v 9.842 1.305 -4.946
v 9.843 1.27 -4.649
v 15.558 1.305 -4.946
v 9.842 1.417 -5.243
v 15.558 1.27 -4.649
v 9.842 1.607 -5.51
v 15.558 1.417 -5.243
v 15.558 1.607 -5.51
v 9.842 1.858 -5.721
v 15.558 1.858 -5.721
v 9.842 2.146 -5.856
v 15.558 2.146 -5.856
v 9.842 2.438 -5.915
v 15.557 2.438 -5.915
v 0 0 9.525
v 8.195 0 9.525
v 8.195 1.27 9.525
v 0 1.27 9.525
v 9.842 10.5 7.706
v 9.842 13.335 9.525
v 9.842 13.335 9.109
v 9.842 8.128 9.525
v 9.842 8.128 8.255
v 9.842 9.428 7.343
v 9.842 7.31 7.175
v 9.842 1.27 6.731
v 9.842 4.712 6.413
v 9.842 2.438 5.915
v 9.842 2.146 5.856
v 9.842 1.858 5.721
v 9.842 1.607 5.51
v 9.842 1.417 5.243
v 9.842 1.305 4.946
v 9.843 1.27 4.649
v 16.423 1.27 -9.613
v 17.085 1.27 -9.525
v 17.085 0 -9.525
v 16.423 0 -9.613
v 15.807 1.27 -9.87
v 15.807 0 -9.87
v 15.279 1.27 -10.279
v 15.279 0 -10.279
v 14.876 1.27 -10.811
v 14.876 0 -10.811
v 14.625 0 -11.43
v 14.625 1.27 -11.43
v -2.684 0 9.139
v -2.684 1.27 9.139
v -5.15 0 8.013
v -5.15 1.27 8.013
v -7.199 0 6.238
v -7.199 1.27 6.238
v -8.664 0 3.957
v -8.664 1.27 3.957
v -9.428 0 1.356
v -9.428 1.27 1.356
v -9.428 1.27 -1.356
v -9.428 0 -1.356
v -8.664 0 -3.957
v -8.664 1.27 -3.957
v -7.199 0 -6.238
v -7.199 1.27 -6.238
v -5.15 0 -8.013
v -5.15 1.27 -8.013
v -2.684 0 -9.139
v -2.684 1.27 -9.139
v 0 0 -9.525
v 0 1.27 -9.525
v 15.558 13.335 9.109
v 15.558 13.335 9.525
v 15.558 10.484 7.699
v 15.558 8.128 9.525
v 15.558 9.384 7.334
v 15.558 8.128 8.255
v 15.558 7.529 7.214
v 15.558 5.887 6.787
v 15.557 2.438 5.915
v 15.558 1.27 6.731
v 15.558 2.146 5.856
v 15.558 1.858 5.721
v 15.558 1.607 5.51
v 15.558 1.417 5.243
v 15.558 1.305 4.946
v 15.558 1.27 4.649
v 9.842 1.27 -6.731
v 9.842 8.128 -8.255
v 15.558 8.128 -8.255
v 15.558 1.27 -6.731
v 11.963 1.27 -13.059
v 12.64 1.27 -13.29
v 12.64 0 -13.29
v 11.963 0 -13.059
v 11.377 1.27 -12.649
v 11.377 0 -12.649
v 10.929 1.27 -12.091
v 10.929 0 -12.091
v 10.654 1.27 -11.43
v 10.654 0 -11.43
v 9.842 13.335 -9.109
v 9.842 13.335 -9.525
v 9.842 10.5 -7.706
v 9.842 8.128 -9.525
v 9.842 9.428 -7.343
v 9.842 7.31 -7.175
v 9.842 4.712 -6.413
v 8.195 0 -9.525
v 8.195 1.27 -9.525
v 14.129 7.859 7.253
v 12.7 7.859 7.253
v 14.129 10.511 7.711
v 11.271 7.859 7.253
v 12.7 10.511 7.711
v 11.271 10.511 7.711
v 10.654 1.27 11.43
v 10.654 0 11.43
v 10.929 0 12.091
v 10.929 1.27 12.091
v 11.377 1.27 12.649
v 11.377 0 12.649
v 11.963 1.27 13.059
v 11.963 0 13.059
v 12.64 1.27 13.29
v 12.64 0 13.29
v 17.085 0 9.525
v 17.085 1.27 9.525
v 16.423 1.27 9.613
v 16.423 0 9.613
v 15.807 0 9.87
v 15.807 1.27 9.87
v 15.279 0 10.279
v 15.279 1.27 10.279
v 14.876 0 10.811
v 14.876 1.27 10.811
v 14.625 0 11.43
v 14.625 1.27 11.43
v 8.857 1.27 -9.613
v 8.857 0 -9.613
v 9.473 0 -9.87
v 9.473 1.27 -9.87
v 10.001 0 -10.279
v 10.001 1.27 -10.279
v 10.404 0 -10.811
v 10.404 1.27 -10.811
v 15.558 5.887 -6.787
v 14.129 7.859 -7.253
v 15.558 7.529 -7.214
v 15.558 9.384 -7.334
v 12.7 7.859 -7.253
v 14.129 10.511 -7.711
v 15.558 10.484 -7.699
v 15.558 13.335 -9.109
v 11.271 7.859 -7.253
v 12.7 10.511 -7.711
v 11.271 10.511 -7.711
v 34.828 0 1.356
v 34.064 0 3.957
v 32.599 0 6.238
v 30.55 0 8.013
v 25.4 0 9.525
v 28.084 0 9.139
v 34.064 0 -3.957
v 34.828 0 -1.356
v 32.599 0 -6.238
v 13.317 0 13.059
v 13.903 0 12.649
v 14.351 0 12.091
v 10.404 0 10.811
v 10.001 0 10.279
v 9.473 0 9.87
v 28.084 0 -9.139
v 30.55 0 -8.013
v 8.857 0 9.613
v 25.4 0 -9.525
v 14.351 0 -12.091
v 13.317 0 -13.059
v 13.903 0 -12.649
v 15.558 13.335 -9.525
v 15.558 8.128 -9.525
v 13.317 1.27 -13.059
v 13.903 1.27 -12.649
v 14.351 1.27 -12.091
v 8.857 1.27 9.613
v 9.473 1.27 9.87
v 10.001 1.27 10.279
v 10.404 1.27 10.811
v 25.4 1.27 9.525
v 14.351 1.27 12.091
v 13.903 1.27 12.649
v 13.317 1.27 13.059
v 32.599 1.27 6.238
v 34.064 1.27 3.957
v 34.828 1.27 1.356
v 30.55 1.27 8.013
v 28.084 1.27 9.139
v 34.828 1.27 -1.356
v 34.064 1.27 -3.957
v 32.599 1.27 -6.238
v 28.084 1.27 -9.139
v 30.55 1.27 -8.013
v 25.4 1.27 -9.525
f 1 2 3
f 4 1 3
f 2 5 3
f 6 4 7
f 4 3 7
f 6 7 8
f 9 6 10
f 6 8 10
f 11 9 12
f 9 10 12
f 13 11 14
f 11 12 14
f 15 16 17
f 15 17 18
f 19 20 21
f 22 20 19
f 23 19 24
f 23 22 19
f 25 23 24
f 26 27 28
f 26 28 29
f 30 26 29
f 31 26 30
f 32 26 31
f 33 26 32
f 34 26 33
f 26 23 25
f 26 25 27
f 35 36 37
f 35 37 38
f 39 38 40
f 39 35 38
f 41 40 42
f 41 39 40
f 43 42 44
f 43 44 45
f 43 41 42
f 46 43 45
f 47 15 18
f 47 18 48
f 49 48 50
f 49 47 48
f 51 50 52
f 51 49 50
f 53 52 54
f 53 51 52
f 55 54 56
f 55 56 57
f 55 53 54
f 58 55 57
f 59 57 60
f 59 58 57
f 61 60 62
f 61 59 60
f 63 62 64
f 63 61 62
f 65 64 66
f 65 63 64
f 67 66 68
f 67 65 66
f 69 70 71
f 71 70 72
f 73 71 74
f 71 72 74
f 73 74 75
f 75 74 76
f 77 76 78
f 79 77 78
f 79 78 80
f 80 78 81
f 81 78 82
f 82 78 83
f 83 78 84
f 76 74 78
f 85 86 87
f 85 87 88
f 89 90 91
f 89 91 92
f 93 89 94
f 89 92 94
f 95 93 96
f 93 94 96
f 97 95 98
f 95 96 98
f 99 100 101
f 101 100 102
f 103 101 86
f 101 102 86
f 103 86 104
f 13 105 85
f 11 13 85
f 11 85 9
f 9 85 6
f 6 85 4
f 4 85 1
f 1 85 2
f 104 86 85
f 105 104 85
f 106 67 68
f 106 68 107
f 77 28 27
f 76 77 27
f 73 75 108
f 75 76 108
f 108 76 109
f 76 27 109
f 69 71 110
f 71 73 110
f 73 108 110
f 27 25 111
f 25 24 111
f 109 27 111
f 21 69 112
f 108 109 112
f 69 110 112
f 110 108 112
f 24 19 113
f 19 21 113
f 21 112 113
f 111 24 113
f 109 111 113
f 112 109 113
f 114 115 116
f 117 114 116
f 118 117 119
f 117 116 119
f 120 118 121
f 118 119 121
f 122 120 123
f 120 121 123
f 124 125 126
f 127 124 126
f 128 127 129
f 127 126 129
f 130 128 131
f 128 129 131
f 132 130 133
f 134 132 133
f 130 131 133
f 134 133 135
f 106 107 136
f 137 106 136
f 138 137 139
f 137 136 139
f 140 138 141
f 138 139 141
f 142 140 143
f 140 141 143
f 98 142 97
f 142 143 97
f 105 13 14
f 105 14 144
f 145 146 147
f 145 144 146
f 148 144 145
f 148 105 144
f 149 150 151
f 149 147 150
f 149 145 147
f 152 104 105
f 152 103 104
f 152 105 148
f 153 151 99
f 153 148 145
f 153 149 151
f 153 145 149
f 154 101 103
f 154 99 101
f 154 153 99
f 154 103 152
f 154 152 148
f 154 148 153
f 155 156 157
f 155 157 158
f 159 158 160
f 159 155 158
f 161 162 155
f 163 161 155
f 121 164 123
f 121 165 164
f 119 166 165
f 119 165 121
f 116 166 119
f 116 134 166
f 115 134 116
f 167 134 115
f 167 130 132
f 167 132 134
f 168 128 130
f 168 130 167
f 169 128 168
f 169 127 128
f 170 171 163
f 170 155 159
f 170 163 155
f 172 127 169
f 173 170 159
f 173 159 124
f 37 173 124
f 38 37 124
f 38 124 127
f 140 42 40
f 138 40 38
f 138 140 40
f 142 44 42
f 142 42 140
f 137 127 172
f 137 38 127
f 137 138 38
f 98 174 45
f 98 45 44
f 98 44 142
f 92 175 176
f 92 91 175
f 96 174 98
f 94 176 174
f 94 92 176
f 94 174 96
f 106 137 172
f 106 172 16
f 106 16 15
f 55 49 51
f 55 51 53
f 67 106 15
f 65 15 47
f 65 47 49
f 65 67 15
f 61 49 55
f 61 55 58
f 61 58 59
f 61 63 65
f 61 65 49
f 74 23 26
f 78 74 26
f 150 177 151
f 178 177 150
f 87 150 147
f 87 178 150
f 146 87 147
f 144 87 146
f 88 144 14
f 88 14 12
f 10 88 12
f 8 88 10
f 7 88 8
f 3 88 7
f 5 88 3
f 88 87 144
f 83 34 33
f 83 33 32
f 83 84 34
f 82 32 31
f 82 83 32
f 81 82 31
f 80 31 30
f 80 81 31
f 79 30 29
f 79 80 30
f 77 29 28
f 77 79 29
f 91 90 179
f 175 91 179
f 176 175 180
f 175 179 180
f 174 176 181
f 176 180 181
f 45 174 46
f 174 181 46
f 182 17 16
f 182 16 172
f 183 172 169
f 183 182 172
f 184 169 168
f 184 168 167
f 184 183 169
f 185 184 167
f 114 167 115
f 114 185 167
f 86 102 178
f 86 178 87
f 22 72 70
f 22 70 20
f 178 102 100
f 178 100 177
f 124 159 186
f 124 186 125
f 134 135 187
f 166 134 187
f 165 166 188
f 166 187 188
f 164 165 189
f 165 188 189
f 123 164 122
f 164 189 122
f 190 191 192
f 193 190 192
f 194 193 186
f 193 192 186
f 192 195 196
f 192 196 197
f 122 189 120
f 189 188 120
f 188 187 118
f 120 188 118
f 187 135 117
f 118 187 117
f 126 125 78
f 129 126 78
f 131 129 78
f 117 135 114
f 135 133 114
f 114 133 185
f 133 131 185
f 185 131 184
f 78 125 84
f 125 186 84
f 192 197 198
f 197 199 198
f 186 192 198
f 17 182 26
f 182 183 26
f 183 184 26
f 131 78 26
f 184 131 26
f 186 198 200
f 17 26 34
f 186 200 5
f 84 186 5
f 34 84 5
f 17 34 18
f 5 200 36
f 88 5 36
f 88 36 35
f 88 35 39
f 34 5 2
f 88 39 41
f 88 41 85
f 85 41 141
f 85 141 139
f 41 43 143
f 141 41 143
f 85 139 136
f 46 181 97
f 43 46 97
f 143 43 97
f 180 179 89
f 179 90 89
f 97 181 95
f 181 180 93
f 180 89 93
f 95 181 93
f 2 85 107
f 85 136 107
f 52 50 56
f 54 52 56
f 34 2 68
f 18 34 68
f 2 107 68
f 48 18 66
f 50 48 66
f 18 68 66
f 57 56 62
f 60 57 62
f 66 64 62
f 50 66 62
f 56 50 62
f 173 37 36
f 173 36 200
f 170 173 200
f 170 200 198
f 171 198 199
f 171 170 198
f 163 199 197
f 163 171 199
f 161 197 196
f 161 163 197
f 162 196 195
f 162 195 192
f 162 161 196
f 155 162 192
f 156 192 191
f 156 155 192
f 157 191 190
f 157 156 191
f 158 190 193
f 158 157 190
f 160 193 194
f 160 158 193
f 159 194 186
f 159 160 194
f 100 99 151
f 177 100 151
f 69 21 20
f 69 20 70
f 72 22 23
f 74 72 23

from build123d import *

# Parameters (mm, degrees)
BOSS_EXTRUDE1_DEPTH = 1.27
SKETCH2_W           = 5.715
SKETCH2_H           = 3.81
BOSS_EXTRUDE2_DEPTH = 12.065
CUT_EXTRUDE1_REACH  = 31.961
SKETCH5_W           = 3.81
SKETCH5_H           = 1.27
BOSS_EXTRUDE3_DEPTH = 3.81
FILLET1_R           = 1.27
FILLET2_R           = 2.54
FILLET3_R           = 2.54


with BuildPart() as part:
    # Sketch1 → Boss-Extrude1 (new body)
    with BuildSketch(Plane(origin=(0, 0, 0), x_dir=(1, 0, 0), z_dir=(0, 1, 0))):
        with BuildLine():
            Line((0, 9.525), (25.4, 9.525))
            ThreePointArc((25.4, 9.525), (34.925, 0), (25.4, -9.525))
            Line((25.4, -9.525), (0, -9.525))
            ThreePointArc((0, -9.525), (-9.525, 0), (0, 9.525))
        make_face()
    extrude(amount=BOSS_EXTRUDE1_DEPTH)

    # Sketch2 → Boss-Extrude2 (add)
    with BuildSketch(Plane(origin=(0, 1.27, 0), x_dir=(1, 0, 0), z_dir=(0, 1, 0))):
        with Locations((12.7, -7.62)):
            Rectangle(SKETCH2_W, SKETCH2_H)
    boss_extrude2 = extrude(amount=BOSS_EXTRUDE2_DEPTH)

    # Sketch3 → Cut-Extrude1 (cut, up to next)
    with BuildSketch(Plane.ZY.offset(-9.8425), mode=Mode.PRIVATE) as cut_extrude1_sk1:
        with BuildLine():
            Line((9.109202439, 13.335), (5.715, 13.335))
            Line((5.715, 13.335), (5.715, 1.27))
            Line((5.715, 1.27), (5.969, 1.27))
            add(Edge.make_bspline(
                [(5.969, 1.27), (5.549329098, 3.350430894), (7.78448223, 7.25064686), (7.073380845, 9.287510022), (8.952423462, 12.969109679), (8.055818696, 11.368012808), (9.109202439, 13.335)],
                knots=[0, 0, 0, 0, 0.483315661, 0.688146198, 0.724664182, 1, 1, 1, 1], degree=3))
        make_face()
    cut_extrude1_tool1 = extrude(cut_extrude1_sk1.sketch, amount=-CUT_EXTRUDE1_REACH, mode=Mode.PRIVATE) & part.part
    # Sketch3 → Cut-Extrude1 (cut, up to next)
    with BuildSketch(Plane.ZY.offset(-9.8425), mode=Mode.PRIVATE) as cut_extrude1_sk2:
        Polygon((9.525, 1.27), (9.525, 8.128), (8.255, 8.128), (6.731, 1.27), align=None)
    cut_extrude1_tool2 = extrude(cut_extrude1_sk2.sketch, amount=-CUT_EXTRUDE1_REACH, mode=Mode.PRIVATE) & part.part
    cut_extrude1_1 = cut_extrude1_tool1.solids().sort_by_distance((9.8425, 9.500256, 6.699344))[0]
    add(cut_extrude1_1, mode=Mode.SUBTRACT)
    cut_extrude1_2 = cut_extrude1_tool2.solids().sort_by_distance((9.8425, 4.270375, 8.461375))[0]
    add(cut_extrude1_2, mode=Mode.SUBTRACT)
    cut_extrude1 = cut_extrude1_1 + cut_extrude1_2  # Cut-Extrude1 as one shape, for the pattern or mirror that repeats it

    # Mirror1: Boss-Extrude2, Cut-Extrude1 across plane
    add(boss_extrude2.mirror(Plane.XY))
    add(cut_extrude1.mirror(Plane.XY), mode=Mode.SUBTRACT)

    # Sketch5 → Boss-Extrude3 (add)
    with BuildSketch(Plane.XY.offset(9.525)):
        with Locations((12.639699769, 0.635)):
            Rectangle(SKETCH5_W, SKETCH5_H)
    boss_extrude3 = extrude(amount=BOSS_EXTRUDE3_DEPTH)

    # Fillet1
    fillet1_edges = [part.edges().sort_by_distance(p)[0] for p in [
        (12.7, 1.27, 5.969),
        (12.7, 1.27, -5.969),
    ]]
    fillet(fillet1_edges, radius=FILLET1_R)

    # Mirror4: Boss-Extrude3 across plane
    add(boss_extrude3.mirror(Plane.XY))

    # Fillet2
    fillet2_edges = [part.edges().sort_by_distance(p)[0] for p in [
        (14.544699769, 0.635, -9.525),
        (10.734699769, 0.635, -9.525),
        (14.544699769, 0.635, 9.525),
        (10.734699769, 0.635, 9.525),
    ]]
    fillet(fillet2_edges, radius=FILLET2_R)

    # Fillet3
    # the kernel refuses this fillet: 2.54 mm, written as the material it takes off along each edge
    with BuildSketch(Plane(origin=(14.544699769, 7.216722124, 13.335), x_dir=(-1, 0, 0), z_dir=(0, -1, 0))) as fillet3_piece_1:
        with BuildLine():
            CenterArc((2.37868885, 2.54), FILLET3_R, 194.477512186, 75.522487814)
            Line((-0.080655575, 1.905), (-0.326590018, 1.8415))
            ThreePointArc((-0.326590018, 1.8415), (-0.254, 1.27), (-0.254, 0))
            Line((-0.254, 0), (0, -0.254))
            Line((0, -0.254), (2.37868885, -0.254))
            Line((2.37868885, -0.254), (2.37868885, 0))
        make_face()
    extrude(amount=13.163444248, mode=Mode.SUBTRACT)
    with BuildSketch(Plane(origin=(10.734699769, -5.946722124, 13.335), x_dir=(-0.04230098759681092, 0, -0.9991049126334703), z_dir=(0, 1, 0))) as fillet3_piece_2:
        with BuildLine():
            CenterArc((2.437105591, -2.484004224), FILLET3_R, 102.053120737, 75.522487814)
            Line((-0.100620888, -2.376559715), (-0.354393535, -2.365815264))
            Line((-0.354393535, -2.365815264), (-0.253772648, 0.010744451))
            Line((-0.253772648, 0.010744451), (0.010744451, 0.253772648))
            ThreePointArc((0.010744451, 0.253772648), (1.27960769, 0.200050394), (1.853666777, 0.248400422))
            Line((1.853666777, 0.248400422), (1.906706669, 0))
        make_face()
    extrude(amount=13.163444248, mode=Mode.SUBTRACT)
    with BuildSketch(Plane(origin=(14.544699769, 7.216722124, -13.335), x_dir=(-1, 0, 0), z_dir=(0, -1, 0))) as fillet3_piece_3:
        with BuildLine():
            CenterArc((2.37868885, -2.54), FILLET3_R, 90, 75.522487814)
            Line((-0.080655575, -1.905), (-0.326590018, -1.8415))
            ThreePointArc((-0.326590018, -1.8415), (-0.254, -1.27), (-0.254, 0))
            Line((-0.254, 0), (0, 0.254))
            Line((0, 0.254), (2.37868885, 0.254))
            Line((2.37868885, 0.254), (2.37868885, 0))
        make_face()
    extrude(amount=13.163444248, mode=Mode.SUBTRACT)
    with BuildSketch(Plane(origin=(10.734699769, -5.946722124, -13.335), x_dir=(-0.04230098759681092, 0, 0.9991049126334703), z_dir=(0, 1, 0))) as fillet3_piece_4:
        with BuildLine():
            CenterArc((2.437105591, 2.484004224), FILLET3_R, 182.424391449, 75.522487814)
            Line((-0.100620888, 2.376559715), (-0.354393535, 2.365815264))
            Line((-0.354393535, 2.365815264), (-0.253772648, -0.010744451))
            Line((-0.253772648, -0.010744451), (0.010744451, -0.253772648))
            ThreePointArc((0.010744451, -0.253772648), (1.27960769, -0.200050394), (1.853666777, -0.248400422))
            Line((1.853666777, -0.248400422), (1.906706669, 0))
        make_face()
    extrude(amount=13.163444248, mode=Mode.SUBTRACT)


solid = part.part
